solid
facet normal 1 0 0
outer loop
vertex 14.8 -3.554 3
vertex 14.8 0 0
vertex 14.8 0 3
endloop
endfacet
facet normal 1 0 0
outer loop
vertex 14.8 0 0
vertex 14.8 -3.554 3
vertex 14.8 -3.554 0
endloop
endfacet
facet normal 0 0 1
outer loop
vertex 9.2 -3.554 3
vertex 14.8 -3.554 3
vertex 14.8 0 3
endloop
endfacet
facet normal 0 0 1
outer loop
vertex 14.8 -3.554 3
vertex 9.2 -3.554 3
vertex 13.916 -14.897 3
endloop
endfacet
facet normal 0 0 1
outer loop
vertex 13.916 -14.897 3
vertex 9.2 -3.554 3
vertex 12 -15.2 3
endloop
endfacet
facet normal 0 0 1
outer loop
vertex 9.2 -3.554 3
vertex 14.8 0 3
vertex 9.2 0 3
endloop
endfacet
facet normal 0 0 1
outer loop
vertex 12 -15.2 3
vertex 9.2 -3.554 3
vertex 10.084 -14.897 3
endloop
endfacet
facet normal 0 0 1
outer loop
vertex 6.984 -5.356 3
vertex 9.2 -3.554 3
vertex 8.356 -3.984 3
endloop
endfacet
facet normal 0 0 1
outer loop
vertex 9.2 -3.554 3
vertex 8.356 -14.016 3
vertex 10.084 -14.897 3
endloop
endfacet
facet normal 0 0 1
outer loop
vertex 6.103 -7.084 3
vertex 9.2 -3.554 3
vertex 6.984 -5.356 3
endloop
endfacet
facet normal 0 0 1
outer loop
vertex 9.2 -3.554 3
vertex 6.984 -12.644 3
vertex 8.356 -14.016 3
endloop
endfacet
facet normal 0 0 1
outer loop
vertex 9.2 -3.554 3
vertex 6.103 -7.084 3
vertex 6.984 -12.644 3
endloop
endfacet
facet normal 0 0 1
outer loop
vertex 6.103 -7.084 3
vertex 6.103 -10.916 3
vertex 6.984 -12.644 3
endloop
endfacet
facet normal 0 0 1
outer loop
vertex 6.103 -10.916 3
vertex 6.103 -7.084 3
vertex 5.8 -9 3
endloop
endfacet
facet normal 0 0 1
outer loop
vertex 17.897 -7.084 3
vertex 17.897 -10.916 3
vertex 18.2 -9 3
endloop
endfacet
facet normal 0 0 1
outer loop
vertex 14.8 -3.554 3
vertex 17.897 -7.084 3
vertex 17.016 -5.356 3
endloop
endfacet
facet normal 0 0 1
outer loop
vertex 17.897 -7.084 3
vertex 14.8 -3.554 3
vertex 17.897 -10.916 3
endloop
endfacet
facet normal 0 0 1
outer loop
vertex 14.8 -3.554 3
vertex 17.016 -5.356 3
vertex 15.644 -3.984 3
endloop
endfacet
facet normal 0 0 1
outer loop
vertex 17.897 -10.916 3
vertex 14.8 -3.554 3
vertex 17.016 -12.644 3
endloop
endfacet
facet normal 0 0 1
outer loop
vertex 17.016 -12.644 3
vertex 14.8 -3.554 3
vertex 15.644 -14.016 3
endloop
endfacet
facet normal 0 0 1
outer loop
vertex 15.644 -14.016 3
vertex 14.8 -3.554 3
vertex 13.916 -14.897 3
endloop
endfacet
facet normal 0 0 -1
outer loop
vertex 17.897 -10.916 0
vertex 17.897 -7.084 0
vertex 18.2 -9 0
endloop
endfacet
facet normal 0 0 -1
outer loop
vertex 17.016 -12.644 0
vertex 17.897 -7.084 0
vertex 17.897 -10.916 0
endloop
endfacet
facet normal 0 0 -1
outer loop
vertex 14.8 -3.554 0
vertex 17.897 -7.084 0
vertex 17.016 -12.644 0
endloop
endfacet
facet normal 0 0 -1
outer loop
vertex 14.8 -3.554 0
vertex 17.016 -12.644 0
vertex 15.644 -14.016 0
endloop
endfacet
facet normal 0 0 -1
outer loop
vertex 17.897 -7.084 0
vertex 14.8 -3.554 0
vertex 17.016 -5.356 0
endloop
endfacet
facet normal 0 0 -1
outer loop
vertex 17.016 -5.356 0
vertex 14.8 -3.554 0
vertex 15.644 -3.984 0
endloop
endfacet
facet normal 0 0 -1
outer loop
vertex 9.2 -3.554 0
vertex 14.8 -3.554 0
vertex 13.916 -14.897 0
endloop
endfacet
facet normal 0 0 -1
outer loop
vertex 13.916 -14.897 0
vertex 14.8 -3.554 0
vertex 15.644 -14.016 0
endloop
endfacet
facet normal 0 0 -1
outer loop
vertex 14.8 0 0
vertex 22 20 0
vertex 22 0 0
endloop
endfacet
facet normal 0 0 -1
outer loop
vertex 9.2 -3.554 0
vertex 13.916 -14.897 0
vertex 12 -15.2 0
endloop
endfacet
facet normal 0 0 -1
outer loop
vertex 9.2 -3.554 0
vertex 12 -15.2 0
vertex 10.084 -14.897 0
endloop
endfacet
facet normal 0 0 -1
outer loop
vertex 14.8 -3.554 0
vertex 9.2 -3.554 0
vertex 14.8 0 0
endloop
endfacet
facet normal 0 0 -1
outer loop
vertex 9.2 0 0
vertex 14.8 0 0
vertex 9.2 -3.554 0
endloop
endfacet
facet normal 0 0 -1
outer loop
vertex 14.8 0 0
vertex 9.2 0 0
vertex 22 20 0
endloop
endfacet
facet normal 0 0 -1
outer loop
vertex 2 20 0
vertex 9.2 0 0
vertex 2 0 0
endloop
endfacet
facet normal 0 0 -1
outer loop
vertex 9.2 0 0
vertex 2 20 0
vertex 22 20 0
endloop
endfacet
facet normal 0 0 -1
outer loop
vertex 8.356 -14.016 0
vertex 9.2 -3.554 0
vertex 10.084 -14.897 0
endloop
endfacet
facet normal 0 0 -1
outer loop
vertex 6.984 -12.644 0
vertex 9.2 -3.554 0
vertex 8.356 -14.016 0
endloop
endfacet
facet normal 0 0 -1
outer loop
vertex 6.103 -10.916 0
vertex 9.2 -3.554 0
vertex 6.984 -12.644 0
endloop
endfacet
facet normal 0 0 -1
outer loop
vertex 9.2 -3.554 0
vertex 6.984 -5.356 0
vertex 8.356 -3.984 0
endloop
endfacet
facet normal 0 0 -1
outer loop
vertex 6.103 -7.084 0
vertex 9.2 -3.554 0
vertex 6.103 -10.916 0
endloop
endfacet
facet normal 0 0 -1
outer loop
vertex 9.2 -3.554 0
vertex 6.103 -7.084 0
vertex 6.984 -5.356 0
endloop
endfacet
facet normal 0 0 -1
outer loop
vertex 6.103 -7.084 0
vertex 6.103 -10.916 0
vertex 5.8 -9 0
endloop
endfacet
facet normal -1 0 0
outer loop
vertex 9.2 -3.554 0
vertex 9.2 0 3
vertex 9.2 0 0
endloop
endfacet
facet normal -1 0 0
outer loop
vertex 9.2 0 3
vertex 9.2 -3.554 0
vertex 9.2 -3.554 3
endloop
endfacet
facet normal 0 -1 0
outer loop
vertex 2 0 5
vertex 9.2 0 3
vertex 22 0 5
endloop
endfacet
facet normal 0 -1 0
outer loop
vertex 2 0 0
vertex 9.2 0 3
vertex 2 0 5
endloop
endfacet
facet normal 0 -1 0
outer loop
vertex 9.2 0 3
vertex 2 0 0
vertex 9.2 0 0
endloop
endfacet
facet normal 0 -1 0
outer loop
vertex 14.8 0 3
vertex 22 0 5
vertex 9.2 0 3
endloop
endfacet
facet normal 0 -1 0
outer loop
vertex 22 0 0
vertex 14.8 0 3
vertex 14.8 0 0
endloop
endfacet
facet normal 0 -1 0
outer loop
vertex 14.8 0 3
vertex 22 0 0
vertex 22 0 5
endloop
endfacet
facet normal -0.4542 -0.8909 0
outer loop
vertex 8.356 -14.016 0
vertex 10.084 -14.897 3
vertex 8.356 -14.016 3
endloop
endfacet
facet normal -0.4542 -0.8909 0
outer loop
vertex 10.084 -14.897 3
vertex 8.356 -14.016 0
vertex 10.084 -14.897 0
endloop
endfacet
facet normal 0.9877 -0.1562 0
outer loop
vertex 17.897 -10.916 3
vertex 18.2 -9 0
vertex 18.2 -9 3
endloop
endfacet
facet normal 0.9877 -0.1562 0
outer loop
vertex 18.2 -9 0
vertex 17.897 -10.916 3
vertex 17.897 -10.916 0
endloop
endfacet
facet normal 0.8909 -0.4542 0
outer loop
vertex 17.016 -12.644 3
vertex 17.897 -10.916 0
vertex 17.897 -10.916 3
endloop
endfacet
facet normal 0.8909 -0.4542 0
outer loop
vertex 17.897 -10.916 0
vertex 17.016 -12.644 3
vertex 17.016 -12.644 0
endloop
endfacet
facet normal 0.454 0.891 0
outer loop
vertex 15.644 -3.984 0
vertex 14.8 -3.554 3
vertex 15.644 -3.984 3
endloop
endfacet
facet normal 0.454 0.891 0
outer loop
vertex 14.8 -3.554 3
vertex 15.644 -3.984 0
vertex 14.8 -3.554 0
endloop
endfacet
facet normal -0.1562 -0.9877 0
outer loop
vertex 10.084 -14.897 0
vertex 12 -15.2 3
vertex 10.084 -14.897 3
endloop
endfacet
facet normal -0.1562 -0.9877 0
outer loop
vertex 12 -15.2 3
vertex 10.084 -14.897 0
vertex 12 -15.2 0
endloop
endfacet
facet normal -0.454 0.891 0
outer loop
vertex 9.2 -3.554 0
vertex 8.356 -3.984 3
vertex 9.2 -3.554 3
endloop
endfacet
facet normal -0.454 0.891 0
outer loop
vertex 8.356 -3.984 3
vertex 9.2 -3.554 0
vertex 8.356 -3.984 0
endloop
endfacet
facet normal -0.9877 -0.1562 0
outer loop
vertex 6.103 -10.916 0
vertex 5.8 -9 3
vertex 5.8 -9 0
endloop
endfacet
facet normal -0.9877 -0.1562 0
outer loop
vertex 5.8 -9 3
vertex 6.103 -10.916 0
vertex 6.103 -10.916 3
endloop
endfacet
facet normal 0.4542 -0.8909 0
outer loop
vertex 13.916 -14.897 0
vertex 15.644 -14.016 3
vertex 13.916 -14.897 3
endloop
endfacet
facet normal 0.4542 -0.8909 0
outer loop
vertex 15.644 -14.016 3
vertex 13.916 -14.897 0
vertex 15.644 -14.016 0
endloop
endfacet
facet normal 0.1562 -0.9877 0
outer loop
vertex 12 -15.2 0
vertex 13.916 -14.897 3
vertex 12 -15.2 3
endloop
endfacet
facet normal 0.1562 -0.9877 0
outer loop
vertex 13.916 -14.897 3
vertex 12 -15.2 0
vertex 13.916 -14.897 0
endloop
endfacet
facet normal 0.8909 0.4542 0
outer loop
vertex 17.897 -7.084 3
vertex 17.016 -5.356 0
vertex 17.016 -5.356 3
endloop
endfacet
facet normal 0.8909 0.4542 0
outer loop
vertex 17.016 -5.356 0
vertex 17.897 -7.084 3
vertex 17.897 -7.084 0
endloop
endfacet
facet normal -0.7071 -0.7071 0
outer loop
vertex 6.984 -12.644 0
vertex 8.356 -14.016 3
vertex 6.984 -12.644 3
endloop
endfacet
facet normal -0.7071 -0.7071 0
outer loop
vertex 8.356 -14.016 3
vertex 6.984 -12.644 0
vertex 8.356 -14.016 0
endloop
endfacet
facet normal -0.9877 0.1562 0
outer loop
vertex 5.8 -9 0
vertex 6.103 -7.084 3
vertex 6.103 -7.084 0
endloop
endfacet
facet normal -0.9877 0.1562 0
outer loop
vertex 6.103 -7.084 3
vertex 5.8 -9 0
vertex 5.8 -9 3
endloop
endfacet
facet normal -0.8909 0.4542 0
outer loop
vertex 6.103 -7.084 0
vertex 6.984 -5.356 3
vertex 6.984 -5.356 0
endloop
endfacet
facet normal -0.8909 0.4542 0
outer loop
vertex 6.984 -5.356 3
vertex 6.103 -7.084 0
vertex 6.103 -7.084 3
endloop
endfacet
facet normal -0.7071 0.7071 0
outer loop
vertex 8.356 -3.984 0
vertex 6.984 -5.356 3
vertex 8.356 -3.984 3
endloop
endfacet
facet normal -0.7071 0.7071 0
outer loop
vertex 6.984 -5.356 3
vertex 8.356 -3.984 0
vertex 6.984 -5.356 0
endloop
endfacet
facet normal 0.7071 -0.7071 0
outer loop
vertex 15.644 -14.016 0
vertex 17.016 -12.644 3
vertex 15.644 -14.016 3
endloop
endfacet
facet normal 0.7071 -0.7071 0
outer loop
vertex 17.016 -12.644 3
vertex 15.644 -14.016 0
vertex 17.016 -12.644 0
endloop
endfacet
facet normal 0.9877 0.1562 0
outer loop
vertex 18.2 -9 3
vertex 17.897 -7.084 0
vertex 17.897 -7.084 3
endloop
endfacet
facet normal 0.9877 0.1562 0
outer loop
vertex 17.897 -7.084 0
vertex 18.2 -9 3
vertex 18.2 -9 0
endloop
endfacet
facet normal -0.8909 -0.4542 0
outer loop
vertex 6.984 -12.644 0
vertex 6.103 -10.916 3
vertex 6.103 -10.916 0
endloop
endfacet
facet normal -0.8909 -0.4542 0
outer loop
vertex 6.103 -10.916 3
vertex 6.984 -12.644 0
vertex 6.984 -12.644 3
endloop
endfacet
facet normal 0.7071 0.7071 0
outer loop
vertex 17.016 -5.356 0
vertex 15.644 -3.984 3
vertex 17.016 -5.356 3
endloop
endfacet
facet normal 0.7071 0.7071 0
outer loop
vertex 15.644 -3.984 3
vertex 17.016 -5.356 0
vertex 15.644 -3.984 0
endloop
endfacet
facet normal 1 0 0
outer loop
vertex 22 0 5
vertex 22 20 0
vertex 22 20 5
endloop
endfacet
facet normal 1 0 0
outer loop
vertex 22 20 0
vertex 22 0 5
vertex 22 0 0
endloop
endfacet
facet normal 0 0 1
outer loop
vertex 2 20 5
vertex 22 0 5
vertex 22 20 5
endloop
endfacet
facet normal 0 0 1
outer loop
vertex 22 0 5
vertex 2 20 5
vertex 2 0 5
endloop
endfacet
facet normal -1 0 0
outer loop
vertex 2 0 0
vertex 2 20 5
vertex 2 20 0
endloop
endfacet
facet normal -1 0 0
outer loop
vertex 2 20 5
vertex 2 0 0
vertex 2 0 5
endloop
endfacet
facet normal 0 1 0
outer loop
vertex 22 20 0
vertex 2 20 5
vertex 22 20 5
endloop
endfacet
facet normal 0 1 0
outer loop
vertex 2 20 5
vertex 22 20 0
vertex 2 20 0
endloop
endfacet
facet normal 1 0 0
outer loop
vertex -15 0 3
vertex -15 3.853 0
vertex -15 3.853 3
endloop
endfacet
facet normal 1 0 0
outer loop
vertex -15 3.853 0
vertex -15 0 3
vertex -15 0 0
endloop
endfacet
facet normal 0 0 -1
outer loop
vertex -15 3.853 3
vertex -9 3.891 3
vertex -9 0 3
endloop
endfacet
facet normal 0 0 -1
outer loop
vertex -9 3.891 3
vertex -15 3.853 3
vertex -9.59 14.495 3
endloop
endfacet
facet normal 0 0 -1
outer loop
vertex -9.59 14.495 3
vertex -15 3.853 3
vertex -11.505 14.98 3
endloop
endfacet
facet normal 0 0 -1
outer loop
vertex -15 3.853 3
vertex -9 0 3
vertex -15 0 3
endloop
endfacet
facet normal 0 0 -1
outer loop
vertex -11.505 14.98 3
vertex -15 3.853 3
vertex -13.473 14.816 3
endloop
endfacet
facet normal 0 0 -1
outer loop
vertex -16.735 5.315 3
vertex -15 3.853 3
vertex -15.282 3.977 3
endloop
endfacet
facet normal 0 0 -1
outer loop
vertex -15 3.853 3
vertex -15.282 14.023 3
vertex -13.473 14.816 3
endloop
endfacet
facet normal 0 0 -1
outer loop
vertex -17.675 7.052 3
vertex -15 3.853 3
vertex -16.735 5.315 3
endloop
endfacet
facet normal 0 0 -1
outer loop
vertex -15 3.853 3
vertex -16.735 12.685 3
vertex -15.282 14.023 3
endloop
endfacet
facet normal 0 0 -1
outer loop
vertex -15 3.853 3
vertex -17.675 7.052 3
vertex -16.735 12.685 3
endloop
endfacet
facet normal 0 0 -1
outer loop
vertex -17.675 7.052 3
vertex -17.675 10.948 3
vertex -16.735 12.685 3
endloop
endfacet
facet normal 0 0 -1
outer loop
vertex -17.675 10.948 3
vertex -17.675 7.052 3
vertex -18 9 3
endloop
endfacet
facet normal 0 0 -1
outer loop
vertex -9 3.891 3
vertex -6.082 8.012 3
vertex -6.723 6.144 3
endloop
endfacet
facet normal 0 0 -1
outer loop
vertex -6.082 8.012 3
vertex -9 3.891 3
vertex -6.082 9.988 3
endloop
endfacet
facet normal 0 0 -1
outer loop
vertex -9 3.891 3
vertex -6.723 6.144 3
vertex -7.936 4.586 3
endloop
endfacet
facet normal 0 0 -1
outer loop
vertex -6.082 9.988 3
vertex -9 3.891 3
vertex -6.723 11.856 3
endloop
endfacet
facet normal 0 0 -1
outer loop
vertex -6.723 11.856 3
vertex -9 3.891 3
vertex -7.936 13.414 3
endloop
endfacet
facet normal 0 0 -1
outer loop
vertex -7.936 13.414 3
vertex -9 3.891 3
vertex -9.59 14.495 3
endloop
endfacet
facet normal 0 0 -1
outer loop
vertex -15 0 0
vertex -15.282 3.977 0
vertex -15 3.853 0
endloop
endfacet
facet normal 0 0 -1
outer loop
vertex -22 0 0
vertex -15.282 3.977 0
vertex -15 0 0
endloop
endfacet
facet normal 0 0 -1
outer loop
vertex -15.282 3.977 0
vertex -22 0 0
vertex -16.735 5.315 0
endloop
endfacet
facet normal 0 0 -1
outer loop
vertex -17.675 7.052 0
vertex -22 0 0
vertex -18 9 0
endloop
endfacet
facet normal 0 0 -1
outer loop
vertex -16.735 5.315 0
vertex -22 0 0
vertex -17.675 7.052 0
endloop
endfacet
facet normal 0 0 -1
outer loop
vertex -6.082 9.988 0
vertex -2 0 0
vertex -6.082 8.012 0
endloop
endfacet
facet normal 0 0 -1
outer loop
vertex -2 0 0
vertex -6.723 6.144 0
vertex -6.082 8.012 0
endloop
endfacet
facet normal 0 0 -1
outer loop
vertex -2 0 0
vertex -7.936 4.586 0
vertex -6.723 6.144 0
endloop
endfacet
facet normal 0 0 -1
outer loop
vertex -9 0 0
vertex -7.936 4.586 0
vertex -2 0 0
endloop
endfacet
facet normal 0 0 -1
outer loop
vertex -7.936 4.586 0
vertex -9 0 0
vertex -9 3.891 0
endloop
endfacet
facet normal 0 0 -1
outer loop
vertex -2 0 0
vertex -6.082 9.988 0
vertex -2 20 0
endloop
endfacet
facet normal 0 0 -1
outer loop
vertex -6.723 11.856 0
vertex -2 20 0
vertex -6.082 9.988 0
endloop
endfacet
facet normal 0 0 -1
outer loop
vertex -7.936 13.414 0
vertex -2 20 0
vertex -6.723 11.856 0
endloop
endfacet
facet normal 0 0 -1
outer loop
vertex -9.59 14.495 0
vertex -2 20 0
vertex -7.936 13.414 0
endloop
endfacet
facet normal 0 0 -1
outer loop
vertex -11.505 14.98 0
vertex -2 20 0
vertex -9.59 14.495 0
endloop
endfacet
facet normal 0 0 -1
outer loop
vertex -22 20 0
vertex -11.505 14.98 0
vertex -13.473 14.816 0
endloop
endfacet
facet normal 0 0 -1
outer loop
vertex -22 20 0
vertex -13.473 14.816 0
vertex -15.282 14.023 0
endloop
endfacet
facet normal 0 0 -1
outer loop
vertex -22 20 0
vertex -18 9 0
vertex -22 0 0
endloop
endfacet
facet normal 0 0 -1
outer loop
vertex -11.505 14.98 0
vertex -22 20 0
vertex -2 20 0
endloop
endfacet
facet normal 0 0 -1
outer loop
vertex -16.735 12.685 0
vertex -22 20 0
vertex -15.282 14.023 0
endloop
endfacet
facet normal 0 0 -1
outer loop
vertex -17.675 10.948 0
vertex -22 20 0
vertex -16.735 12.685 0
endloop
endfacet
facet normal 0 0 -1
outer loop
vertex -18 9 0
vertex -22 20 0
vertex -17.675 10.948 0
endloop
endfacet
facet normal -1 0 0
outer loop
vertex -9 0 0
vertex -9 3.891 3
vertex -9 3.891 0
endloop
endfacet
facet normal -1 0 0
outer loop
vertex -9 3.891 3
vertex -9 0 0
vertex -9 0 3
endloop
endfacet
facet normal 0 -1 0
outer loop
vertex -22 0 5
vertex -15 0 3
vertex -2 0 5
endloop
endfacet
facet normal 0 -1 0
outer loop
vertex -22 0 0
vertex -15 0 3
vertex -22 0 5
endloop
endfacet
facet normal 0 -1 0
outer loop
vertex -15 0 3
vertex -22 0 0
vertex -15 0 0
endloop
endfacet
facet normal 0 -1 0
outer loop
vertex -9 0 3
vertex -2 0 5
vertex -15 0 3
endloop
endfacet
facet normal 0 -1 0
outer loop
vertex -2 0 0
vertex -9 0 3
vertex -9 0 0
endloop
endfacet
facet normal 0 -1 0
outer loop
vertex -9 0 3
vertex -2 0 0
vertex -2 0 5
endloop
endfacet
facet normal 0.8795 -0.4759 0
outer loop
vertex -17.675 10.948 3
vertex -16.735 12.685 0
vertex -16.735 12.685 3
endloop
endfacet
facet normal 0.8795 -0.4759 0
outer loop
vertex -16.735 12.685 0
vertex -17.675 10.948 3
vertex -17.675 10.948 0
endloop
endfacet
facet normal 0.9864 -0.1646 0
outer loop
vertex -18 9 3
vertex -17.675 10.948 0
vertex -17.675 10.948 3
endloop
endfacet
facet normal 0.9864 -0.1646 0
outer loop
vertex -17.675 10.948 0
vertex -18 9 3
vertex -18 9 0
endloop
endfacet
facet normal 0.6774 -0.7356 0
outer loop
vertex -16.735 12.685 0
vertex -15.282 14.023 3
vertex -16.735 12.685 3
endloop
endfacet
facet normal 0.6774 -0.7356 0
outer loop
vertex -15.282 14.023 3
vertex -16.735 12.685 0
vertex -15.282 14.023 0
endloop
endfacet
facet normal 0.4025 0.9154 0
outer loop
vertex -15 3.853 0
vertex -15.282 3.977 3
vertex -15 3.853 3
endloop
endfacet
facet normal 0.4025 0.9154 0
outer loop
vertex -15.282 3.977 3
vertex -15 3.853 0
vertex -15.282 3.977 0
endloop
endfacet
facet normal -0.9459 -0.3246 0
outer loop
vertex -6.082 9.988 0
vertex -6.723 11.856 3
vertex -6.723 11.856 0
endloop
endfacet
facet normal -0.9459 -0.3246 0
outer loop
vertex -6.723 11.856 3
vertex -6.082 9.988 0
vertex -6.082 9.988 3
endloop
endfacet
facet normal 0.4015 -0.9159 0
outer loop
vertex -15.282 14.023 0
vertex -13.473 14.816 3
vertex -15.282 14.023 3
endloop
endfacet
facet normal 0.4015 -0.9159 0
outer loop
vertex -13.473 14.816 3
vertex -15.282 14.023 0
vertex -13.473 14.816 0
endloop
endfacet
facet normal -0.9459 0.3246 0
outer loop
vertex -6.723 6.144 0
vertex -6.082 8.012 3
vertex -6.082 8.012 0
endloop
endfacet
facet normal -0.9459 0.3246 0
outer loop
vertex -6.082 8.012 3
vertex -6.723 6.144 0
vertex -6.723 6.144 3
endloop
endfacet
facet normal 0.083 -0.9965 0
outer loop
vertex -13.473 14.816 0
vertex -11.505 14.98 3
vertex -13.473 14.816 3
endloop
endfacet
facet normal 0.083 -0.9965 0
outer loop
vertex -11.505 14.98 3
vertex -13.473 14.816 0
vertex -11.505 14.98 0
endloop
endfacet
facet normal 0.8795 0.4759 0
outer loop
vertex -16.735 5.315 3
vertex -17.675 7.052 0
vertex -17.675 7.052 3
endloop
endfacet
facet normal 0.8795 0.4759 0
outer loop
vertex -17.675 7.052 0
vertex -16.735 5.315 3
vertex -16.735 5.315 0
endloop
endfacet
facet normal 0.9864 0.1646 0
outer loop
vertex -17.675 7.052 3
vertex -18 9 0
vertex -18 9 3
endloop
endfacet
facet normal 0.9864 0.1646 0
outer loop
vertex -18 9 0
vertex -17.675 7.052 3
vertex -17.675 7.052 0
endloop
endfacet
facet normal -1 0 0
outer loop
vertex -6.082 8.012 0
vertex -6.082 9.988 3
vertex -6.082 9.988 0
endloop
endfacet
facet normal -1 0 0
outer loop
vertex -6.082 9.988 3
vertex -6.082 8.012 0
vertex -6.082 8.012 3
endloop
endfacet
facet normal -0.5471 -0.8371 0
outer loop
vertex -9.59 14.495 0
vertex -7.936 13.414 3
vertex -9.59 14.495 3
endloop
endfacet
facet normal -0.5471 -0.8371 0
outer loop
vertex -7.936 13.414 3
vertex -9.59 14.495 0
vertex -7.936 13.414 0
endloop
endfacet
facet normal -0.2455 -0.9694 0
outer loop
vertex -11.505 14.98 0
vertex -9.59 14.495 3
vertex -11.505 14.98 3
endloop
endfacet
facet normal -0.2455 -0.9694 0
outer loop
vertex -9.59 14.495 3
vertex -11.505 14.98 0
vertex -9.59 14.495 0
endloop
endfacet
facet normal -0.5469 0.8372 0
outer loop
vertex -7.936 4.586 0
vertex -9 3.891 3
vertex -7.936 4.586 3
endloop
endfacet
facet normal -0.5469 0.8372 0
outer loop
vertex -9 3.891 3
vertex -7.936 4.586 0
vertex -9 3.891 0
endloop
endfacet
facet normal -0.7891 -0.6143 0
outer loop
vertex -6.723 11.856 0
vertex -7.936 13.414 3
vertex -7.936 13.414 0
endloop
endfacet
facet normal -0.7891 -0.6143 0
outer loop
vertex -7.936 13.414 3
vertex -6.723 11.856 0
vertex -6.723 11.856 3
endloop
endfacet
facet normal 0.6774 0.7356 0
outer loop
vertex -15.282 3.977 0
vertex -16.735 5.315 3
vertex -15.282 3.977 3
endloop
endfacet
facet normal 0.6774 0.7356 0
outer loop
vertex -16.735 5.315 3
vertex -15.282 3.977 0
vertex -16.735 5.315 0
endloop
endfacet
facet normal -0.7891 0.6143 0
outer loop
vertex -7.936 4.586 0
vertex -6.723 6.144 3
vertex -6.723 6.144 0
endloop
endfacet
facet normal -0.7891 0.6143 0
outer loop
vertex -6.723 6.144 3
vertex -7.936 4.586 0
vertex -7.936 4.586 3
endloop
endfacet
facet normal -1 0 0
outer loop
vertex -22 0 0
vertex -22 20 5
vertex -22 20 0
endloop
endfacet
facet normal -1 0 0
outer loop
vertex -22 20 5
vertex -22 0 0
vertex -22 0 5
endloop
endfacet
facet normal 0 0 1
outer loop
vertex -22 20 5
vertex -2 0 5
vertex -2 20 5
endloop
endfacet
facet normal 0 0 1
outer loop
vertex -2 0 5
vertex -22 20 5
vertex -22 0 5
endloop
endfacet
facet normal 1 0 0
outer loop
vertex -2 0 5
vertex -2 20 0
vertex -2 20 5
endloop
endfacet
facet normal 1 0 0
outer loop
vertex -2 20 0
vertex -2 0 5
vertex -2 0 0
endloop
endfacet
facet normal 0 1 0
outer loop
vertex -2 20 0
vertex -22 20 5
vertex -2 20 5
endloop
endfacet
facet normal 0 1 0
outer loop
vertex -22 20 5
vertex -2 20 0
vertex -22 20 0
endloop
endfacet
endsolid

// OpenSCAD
//Interlocking pieces for the bird table design
//copyright SJ Hindmarch 2015

module lug(tol){
	cylinder(h=3,r=6-tol);
}

module screwhole(){
	cylinder(h=5,r=1);
}

module base(){
	cube([20,20,5]);
}

module lock(tol){
	cube([6+(tol*2),5,3]);
	translate([3+tol,9,0,]){lug(tol);}
}

module male(tol){
	translate([2,0,0])base();
	mirror([0,1,0])translate([9-tol,0,0]){
		lock(tol);
	}
}

module female(tol){
	mirror([1,0,0])
	difference(){
		translate([2,0,0])base();
		translate([9,0,0])lock(tol);
	}
}

male(-0.2);
female(0);

//!lock(0);
//!base();
